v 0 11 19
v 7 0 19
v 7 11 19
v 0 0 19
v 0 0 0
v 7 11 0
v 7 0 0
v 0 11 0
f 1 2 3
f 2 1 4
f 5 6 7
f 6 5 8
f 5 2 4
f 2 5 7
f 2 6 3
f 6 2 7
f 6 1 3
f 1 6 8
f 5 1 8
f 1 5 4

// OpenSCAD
// Generated by SolidPython 1.0.1 on 2020-07-29 00:39:26


cube(size = [7, 11, 19]);
/***********************************************
*********      SolidPython code:      **********
************************************************
 
# import packages: SolidPython
from solid import *
from solid.utils import *
from itertools import chain, combinations


class Resize:

    def __init__(self, scad_file):
        self.scad_file = scad_file
        #self.scad_file = import_scad(scad_file)
        # cone/cylinder param:
        self.r1 = 0
        self.r2 = 0
        self.h = 0
        # rectangular prism param:
        self.w = 0
        self.l = 0
        # ellipse param:
        self.r = 0

    # import OpenScad code (file name corresponds to shape)


    # classify shape + parameters
    def assign(self, param1, param2, param3):
        if self.scad_file == 'cone.scad':
            self.r1 = param1
            self.r2 = param2
            self.h = param3
        elif self.scad_file == 'cylinder.scad':
            self.r1 = param1
            self.r2 = param2
            self.h = param3
        elif self.scad_file == 'rectangularPrism.scad':
            self.h = param1
            self.l = param2
            self.w = param3
        else:
            self.r = param1
            self.h = param2

    # resize parameters
    def iterate(self):
        x = range(3, 20, 2)
        i = 1
        if self.scad_file == 'cone.scad':
            tempList = list(combinations(x, 2))
            for temp in tempList:
                param1 = temp[0]
                param2 = temp[1]
                filepath = 'produced_scad_files/' + 'cone' + str(param1) + '_' + str(param2) + '_' + '.scad'
                scad_render_to_file(cylinder(h=param1, r1=param2, r2=0), filepath)

        elif self.scad_file == 'cylinder.scad':
            tempList = list(combinations(x, 3))
            for temp in tempList:
                param1 = temp[0]
                param2 = temp[1]
                filepath = 'produced_scad_files/' + 'cylinder' + str(param1) + '_' + str(param2) + '_' + '.scad'
                scad_render_to_file(cylinder(h=param1, r1=param2, r2=param2), filepath)

        elif self.scad_file == 'rectangularPrism.scad':
            tempList = list(combinations(x, 3))
            for temp in tempList:
                param1 = temp[0]
                param2 = temp[1]
                param3 = temp[2]
                filepath = 'produced_scad_files/' + 'rectangularPrism' + str(param1) + '_' + str(param2) + '_' + str(
                    param3) + '.scad'
                scad_render_to_file(cube(size=(param1, param2, param3)), filepath)

        elif self.scad_file == 'ellipse.scad':
            tempList = list(combinations(x, 4))
            for temp in tempList:
                param1 = temp[0]
                param2 = temp[1]
                param3 = temp[2]
                param4 = temp[3]
                filepath = 'produced_scad_files/' + 'ellipse' + str(param1) + '_' + str(param2) + '_' + str(param3) + '_' + str(param4) + '.scad'
                scad_render_to_file(scale([param1, param2, param3])(sphere(r=param4)), filepath)

    def render_to_scadfile(self):
        scad_render_to_file(scad, 'example.scad') 
 
************************************************/
